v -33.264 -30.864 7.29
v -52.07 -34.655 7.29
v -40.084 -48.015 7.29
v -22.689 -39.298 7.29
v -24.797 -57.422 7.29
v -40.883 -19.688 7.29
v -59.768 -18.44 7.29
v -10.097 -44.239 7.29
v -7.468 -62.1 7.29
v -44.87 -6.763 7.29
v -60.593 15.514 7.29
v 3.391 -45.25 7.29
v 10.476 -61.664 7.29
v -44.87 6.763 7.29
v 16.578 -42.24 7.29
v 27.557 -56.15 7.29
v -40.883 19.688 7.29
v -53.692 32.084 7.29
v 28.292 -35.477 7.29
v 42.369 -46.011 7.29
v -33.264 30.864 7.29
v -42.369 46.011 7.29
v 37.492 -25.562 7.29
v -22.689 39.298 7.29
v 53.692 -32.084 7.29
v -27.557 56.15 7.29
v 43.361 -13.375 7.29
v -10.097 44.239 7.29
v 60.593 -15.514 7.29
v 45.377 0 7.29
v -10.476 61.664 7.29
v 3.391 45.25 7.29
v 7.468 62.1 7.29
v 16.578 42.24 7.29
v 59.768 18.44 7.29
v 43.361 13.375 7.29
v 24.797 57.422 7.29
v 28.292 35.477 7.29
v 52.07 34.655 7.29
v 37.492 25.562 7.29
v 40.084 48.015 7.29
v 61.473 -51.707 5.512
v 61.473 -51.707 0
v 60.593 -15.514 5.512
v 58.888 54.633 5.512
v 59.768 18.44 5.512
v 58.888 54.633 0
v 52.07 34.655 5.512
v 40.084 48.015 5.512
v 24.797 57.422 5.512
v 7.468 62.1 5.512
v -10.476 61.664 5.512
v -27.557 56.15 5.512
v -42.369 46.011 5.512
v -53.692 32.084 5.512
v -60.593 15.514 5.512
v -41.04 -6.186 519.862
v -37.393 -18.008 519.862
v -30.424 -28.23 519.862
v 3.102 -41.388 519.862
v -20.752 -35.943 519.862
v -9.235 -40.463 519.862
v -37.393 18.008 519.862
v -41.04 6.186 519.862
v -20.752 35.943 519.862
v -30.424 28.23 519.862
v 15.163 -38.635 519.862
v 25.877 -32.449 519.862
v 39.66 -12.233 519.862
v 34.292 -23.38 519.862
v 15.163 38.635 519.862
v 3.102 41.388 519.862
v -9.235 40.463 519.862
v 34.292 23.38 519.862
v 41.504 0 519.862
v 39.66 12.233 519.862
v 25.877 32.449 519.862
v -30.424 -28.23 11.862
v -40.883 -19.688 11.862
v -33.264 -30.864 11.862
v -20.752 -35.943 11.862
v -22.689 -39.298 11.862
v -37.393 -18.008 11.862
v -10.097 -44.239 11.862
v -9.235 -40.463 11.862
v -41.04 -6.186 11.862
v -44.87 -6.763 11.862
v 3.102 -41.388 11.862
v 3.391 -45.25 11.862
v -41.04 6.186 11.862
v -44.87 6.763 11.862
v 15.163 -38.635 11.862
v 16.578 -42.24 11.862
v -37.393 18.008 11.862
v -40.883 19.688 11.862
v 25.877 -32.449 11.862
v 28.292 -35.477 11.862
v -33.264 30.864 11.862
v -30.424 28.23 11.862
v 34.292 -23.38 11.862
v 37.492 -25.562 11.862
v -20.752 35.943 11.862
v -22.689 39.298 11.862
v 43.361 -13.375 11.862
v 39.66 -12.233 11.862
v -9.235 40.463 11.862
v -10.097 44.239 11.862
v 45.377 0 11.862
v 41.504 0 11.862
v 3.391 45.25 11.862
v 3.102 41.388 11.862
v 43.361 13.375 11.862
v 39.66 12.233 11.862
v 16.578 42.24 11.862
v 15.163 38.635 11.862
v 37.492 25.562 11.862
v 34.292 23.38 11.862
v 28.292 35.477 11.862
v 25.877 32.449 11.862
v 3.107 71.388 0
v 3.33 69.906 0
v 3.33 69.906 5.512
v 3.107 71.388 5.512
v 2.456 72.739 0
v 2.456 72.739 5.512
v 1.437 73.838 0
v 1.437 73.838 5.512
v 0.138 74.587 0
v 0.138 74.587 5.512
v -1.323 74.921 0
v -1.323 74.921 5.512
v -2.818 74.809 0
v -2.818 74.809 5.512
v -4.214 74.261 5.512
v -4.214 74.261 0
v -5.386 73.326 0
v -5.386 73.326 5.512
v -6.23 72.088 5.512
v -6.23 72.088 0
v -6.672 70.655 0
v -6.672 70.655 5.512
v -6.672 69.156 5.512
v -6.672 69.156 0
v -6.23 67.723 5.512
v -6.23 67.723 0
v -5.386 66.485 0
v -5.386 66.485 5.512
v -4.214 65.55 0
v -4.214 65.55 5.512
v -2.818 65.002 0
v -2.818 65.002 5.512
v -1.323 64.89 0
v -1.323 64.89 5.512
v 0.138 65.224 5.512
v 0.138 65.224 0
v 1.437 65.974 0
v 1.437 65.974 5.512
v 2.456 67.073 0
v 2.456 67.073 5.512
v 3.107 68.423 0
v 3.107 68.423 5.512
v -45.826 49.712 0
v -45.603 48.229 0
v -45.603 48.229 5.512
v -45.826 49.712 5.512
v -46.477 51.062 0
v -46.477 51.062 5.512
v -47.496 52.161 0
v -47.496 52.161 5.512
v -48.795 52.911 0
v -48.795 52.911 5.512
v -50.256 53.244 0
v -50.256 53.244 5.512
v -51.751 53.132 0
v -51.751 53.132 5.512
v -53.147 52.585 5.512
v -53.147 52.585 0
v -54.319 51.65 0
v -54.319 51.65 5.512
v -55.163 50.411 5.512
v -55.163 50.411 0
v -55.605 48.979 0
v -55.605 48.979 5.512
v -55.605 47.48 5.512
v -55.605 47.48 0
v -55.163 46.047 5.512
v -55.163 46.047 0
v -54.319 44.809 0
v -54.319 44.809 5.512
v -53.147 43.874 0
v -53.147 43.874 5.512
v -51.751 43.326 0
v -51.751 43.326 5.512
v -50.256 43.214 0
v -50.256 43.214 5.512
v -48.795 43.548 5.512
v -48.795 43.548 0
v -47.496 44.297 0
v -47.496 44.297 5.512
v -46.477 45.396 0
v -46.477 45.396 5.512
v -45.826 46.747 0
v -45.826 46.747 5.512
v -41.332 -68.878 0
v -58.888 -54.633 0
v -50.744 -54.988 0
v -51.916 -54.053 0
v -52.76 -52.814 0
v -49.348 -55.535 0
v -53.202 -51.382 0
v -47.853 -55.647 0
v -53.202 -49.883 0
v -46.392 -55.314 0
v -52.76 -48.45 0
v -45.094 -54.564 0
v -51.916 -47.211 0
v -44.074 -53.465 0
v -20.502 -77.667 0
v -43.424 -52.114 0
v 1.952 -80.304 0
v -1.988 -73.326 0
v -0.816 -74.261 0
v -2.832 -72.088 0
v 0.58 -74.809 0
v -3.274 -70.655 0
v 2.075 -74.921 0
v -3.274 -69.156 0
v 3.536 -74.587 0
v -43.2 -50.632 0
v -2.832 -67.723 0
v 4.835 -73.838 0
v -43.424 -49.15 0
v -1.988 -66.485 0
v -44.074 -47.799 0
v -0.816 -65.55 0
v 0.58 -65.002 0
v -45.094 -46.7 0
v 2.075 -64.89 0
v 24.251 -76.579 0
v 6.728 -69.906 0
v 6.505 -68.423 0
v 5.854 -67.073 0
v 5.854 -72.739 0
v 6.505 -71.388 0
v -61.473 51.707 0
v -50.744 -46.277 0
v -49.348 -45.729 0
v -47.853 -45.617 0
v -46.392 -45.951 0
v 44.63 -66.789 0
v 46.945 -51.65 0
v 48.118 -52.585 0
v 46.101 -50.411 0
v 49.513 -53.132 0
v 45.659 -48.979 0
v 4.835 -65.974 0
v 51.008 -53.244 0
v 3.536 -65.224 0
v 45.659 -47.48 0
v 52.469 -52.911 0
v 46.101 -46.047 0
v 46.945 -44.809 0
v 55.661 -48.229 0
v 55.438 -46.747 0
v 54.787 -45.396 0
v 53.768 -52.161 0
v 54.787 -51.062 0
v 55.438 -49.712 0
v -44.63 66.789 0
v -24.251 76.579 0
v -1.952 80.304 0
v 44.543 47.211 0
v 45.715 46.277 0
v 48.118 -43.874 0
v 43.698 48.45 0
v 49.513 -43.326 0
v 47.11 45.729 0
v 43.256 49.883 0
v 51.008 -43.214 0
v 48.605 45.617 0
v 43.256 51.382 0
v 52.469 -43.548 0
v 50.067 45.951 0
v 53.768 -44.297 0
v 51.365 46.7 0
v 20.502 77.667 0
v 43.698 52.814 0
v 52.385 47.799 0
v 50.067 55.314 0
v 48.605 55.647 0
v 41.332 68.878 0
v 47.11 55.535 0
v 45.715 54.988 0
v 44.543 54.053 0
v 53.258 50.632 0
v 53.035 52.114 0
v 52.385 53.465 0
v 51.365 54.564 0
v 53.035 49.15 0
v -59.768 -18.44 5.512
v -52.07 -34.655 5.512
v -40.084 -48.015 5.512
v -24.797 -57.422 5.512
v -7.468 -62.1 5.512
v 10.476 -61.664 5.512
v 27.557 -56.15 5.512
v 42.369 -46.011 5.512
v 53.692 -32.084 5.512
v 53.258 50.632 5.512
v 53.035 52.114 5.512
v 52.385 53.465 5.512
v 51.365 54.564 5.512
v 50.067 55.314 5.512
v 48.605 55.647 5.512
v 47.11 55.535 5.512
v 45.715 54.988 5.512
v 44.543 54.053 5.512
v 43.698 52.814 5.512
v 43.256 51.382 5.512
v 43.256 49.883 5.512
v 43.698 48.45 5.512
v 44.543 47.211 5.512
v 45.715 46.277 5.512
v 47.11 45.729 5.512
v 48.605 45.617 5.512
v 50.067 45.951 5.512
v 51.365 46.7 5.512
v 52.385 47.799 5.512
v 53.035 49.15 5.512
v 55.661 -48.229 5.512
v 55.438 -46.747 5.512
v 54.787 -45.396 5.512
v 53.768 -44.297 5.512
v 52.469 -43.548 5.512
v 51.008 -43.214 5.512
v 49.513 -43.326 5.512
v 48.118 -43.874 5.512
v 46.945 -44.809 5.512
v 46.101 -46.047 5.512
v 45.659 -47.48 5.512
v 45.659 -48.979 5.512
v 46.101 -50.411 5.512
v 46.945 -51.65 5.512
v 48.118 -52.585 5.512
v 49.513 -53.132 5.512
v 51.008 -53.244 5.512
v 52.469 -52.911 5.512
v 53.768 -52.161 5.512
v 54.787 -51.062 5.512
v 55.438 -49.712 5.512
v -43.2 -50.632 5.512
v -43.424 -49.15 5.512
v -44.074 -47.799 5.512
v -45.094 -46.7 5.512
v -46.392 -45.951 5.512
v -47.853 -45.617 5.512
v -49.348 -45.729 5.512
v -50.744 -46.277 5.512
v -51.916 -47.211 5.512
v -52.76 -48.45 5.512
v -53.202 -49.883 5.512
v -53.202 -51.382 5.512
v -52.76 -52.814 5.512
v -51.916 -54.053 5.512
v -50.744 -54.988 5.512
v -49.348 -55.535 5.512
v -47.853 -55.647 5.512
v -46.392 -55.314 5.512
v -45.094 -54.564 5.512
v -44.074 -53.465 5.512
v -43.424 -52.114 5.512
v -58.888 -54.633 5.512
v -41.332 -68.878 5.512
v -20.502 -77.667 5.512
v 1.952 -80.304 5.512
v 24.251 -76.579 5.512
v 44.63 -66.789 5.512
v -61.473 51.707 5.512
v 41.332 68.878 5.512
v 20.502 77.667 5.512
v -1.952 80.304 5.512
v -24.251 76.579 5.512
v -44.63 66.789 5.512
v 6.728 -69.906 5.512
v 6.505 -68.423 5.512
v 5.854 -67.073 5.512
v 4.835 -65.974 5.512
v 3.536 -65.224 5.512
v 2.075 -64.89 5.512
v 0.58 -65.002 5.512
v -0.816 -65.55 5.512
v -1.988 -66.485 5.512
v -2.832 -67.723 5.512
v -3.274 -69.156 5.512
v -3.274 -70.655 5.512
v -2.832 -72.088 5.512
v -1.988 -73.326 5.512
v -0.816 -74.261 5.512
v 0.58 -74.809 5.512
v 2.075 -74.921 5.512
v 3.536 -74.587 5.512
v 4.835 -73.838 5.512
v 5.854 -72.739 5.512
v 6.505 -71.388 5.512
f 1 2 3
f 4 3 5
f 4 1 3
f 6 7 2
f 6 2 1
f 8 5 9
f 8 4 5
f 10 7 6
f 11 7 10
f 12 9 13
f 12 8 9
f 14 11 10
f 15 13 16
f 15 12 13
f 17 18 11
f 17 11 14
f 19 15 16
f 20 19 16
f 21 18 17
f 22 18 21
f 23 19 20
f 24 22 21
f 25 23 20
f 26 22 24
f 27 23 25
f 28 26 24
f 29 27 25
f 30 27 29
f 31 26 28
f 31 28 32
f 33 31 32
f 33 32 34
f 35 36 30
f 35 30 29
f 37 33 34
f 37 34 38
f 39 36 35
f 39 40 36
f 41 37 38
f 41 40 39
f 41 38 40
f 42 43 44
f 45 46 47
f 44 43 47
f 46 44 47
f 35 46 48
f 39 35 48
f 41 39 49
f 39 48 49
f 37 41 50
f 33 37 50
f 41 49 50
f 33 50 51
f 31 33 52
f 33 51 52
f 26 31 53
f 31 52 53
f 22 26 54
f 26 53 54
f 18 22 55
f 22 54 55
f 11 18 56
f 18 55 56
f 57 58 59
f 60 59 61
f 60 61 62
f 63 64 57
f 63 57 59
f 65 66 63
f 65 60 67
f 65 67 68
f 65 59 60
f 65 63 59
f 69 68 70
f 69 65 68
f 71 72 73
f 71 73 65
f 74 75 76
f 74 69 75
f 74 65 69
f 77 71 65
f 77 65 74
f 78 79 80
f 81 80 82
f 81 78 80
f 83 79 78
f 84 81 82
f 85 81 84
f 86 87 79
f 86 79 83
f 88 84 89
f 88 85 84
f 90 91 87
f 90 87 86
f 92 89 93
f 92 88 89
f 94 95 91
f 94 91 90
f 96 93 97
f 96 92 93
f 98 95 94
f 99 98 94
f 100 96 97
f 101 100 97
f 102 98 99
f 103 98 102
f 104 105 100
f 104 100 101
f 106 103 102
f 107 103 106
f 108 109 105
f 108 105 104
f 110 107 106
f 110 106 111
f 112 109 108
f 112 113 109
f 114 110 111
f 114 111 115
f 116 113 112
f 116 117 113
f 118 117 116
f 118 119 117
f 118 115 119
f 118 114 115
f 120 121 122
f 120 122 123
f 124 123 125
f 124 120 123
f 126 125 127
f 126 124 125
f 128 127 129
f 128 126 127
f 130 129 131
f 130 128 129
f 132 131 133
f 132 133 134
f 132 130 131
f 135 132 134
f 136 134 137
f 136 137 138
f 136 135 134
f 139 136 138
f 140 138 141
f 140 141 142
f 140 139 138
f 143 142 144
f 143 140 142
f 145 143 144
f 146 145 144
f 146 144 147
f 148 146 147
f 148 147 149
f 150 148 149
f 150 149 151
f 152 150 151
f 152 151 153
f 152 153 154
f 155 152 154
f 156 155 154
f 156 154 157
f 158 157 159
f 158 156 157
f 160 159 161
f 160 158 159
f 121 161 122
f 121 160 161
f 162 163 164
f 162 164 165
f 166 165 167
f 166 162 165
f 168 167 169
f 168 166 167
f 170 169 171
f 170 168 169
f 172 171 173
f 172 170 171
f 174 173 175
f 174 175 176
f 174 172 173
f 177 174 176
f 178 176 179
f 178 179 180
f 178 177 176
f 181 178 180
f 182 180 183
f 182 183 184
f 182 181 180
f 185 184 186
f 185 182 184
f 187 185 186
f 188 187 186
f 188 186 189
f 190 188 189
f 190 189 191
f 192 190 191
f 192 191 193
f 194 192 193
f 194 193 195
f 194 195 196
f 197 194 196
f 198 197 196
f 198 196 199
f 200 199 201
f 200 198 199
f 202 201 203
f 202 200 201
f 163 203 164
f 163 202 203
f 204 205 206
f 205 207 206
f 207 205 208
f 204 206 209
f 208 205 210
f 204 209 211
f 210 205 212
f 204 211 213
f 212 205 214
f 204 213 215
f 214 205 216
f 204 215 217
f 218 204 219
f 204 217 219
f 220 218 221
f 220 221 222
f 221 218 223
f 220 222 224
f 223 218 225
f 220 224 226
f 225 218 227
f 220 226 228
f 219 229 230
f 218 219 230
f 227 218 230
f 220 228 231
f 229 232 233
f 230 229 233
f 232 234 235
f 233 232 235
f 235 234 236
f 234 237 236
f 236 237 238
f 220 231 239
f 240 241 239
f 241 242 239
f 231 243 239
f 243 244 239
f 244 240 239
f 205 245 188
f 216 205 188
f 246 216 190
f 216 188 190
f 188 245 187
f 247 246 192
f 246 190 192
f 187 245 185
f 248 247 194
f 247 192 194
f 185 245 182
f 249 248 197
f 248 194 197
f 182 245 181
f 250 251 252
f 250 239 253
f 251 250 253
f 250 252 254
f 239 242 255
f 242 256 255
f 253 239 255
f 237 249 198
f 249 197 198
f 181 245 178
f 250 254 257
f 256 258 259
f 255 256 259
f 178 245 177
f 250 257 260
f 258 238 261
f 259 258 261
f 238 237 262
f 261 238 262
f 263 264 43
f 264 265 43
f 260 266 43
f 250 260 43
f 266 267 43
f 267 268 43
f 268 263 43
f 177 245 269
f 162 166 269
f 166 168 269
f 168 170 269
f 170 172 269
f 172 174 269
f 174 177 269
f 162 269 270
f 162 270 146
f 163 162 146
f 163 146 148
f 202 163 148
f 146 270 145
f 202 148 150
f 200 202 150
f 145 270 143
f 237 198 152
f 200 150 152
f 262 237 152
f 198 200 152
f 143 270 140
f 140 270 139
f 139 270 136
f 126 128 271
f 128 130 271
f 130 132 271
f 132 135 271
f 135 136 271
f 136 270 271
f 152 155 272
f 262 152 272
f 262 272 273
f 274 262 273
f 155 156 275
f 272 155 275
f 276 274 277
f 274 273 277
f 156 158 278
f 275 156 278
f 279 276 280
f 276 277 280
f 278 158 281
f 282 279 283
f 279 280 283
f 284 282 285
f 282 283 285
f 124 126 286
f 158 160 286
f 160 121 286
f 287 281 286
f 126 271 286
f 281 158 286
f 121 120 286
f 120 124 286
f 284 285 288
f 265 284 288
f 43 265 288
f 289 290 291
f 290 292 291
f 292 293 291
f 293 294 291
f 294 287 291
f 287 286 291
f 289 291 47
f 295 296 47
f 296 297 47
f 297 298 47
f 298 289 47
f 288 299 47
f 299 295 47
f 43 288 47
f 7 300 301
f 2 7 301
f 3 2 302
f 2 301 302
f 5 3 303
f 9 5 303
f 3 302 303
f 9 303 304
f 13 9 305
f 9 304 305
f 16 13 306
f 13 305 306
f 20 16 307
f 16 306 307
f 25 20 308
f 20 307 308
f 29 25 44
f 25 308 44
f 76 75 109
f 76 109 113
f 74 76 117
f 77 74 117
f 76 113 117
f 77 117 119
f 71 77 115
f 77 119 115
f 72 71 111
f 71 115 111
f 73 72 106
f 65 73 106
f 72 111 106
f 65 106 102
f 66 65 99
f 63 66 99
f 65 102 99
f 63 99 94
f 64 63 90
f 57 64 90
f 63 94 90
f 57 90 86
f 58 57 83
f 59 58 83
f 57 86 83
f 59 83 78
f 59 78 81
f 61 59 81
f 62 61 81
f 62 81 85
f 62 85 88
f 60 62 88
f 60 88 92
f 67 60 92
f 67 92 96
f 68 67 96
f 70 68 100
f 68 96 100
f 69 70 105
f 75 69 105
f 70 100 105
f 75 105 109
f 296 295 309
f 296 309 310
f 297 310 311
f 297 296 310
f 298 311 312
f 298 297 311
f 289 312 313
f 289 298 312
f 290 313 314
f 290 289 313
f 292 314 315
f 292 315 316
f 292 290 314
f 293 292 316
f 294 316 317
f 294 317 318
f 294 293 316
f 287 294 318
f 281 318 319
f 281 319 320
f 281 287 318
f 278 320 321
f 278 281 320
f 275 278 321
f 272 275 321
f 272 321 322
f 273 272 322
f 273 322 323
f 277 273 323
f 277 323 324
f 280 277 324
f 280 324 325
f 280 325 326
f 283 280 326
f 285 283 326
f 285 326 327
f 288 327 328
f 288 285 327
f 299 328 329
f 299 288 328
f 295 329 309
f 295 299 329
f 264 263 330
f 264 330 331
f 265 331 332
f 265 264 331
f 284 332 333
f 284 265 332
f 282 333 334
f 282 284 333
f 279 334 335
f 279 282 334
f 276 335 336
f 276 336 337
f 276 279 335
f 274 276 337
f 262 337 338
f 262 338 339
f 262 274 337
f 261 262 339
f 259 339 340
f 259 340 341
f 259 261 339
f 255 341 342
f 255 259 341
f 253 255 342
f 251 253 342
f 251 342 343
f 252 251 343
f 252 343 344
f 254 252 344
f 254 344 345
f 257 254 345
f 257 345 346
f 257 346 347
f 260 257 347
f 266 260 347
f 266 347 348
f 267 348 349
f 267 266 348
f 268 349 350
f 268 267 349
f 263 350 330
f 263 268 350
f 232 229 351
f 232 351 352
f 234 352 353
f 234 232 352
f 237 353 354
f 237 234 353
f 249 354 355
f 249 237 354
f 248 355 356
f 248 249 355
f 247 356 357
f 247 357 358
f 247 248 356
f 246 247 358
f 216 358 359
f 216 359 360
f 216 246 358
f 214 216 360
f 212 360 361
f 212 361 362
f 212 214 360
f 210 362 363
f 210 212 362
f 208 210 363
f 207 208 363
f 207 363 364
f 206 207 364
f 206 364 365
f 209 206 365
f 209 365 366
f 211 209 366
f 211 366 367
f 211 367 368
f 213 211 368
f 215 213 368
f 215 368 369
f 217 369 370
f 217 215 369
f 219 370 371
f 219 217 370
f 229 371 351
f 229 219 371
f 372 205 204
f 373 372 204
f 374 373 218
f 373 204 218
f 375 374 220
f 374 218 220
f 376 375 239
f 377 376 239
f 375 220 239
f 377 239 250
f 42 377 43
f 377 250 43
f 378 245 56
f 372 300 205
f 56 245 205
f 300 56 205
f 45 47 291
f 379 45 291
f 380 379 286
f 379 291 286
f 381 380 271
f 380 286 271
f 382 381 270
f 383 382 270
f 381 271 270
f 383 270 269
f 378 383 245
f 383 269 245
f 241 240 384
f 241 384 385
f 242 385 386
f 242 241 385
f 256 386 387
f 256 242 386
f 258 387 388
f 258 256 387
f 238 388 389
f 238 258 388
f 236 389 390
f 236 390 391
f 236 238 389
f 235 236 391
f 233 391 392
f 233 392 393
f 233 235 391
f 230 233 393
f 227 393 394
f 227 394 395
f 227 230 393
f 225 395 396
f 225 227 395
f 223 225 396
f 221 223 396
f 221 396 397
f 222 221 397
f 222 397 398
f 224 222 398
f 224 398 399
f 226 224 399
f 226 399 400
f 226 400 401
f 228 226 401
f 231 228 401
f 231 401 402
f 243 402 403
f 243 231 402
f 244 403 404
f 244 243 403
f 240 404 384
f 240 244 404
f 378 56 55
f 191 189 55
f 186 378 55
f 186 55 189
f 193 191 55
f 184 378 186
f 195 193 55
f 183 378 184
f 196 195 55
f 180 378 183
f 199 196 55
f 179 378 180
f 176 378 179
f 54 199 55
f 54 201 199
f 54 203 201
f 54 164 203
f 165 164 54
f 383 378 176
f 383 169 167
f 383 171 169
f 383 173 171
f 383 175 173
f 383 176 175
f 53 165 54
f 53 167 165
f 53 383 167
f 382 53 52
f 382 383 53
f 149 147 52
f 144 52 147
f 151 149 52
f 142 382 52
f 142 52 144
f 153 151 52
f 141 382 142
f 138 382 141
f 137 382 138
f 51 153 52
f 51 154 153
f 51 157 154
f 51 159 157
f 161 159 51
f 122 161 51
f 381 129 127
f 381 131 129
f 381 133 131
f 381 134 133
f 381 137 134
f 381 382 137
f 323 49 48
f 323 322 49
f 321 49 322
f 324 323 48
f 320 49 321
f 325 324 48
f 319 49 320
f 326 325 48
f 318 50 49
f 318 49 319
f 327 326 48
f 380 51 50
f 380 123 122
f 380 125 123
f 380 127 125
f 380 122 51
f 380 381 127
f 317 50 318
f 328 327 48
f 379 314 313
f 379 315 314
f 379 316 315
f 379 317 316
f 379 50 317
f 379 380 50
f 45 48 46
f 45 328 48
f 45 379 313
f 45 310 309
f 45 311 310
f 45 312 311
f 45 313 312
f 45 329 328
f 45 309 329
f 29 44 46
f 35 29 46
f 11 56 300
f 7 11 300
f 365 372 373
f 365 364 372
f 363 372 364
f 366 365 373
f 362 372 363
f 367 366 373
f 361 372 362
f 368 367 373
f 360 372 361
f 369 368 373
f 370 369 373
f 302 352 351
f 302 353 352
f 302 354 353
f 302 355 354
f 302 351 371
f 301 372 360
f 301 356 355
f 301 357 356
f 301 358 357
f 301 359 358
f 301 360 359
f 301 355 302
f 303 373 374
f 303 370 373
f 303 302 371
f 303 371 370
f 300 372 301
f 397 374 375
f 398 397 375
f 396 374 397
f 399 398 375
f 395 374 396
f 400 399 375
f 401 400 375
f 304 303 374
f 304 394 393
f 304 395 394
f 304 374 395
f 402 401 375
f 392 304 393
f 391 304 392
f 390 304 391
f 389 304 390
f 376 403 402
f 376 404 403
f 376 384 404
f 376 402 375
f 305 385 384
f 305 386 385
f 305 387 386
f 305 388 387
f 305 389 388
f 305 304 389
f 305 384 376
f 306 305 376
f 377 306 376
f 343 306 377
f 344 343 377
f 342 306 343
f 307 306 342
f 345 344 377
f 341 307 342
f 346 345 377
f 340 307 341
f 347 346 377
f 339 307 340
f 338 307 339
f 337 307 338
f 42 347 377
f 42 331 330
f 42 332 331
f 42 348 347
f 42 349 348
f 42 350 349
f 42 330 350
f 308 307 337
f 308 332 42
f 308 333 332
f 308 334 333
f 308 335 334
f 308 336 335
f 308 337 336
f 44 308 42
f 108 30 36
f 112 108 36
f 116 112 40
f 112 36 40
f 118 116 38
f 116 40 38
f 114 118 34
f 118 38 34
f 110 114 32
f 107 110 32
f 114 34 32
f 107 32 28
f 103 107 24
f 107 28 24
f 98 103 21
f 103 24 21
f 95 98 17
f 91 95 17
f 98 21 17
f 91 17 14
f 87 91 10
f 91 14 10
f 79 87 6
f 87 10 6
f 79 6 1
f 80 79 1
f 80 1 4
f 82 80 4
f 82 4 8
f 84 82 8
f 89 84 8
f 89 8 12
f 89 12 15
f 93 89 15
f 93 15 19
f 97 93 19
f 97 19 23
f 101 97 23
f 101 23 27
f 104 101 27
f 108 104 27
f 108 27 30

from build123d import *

# Parameters (mm, degrees)
F0_R     = 5.0292
F1_DEPTH = 5.5118
F2_R     = 45.3771
F3_DEPTH = 6.35
F5_DEPTH = 1.778
F6_R     = 41.5036
F7_DEPTH = 508


with BuildPart() as f1:
    # F0 (on Top) → F1 (new body)
    with BuildSketch(Plane.XY):
        with BuildLine():
            Line((61.47253, -51.707207), (58.887924, 54.632588))
            ThreePointArc((58.887924, 54.632588), (-1.951797, 80.303784), (-61.47253, 51.707207))
            Line((-61.47253, 51.707207), (-58.887924, -54.632588))
            ThreePointArc((-58.887924, -54.632588), (1.951797, -80.303784), (61.47253, -51.707207))
        make_face()
        with Locations((-48.229271, -50.632113)):
            Circle(F0_R, mode=Mode.SUBTRACT)
        with Locations((1.699066, -69.905555)):
            Circle(F0_R, mode=Mode.SUBTRACT)
        with Locations((50.632113, -48.229271)):
            Circle(F0_R, mode=Mode.SUBTRACT)
        with Locations((-50.632113, 48.229271)):
            Circle(F0_R, mode=Mode.SUBTRACT)
        with Locations((-1.699066, 69.905555)):
            Circle(F0_R, mode=Mode.SUBTRACT)
        with Locations((48.229271, 50.632113)):
            Circle(F0_R, mode=Mode.SUBTRACT)
    extrude(amount=F1_DEPTH)

    # F2 (on face) → F3 (join)
    with BuildSketch(Plane.XY.offset(5.5118)):
        Circle(F2_R)
    extrude(amount=F3_DEPTH)

    # F4 (on face) → F5 (join)
    with BuildSketch(Plane.XY.offset(5.5118)):
        with BuildLine():
            Line((-60.592857, 15.514361), (-59.767597, -18.439742))
            ThreePointArc((-59.767597, -18.439742), (1.519779, -62.529033), (60.592857, -15.514361))
            Line((60.592857, -15.514361), (59.767597, 18.439742))
            ThreePointArc((59.767597, 18.439742), (-1.519779, 62.529033), (-60.592857, 15.514361))
        make_face()
    extrude(amount=F5_DEPTH)

    # F6 (on face) → F7 (join)
    with BuildSketch(Plane.XY.offset(11.8618)):
        Circle(F6_R)
    extrude(amount=F7_DEPTH)


solid = f1.part
